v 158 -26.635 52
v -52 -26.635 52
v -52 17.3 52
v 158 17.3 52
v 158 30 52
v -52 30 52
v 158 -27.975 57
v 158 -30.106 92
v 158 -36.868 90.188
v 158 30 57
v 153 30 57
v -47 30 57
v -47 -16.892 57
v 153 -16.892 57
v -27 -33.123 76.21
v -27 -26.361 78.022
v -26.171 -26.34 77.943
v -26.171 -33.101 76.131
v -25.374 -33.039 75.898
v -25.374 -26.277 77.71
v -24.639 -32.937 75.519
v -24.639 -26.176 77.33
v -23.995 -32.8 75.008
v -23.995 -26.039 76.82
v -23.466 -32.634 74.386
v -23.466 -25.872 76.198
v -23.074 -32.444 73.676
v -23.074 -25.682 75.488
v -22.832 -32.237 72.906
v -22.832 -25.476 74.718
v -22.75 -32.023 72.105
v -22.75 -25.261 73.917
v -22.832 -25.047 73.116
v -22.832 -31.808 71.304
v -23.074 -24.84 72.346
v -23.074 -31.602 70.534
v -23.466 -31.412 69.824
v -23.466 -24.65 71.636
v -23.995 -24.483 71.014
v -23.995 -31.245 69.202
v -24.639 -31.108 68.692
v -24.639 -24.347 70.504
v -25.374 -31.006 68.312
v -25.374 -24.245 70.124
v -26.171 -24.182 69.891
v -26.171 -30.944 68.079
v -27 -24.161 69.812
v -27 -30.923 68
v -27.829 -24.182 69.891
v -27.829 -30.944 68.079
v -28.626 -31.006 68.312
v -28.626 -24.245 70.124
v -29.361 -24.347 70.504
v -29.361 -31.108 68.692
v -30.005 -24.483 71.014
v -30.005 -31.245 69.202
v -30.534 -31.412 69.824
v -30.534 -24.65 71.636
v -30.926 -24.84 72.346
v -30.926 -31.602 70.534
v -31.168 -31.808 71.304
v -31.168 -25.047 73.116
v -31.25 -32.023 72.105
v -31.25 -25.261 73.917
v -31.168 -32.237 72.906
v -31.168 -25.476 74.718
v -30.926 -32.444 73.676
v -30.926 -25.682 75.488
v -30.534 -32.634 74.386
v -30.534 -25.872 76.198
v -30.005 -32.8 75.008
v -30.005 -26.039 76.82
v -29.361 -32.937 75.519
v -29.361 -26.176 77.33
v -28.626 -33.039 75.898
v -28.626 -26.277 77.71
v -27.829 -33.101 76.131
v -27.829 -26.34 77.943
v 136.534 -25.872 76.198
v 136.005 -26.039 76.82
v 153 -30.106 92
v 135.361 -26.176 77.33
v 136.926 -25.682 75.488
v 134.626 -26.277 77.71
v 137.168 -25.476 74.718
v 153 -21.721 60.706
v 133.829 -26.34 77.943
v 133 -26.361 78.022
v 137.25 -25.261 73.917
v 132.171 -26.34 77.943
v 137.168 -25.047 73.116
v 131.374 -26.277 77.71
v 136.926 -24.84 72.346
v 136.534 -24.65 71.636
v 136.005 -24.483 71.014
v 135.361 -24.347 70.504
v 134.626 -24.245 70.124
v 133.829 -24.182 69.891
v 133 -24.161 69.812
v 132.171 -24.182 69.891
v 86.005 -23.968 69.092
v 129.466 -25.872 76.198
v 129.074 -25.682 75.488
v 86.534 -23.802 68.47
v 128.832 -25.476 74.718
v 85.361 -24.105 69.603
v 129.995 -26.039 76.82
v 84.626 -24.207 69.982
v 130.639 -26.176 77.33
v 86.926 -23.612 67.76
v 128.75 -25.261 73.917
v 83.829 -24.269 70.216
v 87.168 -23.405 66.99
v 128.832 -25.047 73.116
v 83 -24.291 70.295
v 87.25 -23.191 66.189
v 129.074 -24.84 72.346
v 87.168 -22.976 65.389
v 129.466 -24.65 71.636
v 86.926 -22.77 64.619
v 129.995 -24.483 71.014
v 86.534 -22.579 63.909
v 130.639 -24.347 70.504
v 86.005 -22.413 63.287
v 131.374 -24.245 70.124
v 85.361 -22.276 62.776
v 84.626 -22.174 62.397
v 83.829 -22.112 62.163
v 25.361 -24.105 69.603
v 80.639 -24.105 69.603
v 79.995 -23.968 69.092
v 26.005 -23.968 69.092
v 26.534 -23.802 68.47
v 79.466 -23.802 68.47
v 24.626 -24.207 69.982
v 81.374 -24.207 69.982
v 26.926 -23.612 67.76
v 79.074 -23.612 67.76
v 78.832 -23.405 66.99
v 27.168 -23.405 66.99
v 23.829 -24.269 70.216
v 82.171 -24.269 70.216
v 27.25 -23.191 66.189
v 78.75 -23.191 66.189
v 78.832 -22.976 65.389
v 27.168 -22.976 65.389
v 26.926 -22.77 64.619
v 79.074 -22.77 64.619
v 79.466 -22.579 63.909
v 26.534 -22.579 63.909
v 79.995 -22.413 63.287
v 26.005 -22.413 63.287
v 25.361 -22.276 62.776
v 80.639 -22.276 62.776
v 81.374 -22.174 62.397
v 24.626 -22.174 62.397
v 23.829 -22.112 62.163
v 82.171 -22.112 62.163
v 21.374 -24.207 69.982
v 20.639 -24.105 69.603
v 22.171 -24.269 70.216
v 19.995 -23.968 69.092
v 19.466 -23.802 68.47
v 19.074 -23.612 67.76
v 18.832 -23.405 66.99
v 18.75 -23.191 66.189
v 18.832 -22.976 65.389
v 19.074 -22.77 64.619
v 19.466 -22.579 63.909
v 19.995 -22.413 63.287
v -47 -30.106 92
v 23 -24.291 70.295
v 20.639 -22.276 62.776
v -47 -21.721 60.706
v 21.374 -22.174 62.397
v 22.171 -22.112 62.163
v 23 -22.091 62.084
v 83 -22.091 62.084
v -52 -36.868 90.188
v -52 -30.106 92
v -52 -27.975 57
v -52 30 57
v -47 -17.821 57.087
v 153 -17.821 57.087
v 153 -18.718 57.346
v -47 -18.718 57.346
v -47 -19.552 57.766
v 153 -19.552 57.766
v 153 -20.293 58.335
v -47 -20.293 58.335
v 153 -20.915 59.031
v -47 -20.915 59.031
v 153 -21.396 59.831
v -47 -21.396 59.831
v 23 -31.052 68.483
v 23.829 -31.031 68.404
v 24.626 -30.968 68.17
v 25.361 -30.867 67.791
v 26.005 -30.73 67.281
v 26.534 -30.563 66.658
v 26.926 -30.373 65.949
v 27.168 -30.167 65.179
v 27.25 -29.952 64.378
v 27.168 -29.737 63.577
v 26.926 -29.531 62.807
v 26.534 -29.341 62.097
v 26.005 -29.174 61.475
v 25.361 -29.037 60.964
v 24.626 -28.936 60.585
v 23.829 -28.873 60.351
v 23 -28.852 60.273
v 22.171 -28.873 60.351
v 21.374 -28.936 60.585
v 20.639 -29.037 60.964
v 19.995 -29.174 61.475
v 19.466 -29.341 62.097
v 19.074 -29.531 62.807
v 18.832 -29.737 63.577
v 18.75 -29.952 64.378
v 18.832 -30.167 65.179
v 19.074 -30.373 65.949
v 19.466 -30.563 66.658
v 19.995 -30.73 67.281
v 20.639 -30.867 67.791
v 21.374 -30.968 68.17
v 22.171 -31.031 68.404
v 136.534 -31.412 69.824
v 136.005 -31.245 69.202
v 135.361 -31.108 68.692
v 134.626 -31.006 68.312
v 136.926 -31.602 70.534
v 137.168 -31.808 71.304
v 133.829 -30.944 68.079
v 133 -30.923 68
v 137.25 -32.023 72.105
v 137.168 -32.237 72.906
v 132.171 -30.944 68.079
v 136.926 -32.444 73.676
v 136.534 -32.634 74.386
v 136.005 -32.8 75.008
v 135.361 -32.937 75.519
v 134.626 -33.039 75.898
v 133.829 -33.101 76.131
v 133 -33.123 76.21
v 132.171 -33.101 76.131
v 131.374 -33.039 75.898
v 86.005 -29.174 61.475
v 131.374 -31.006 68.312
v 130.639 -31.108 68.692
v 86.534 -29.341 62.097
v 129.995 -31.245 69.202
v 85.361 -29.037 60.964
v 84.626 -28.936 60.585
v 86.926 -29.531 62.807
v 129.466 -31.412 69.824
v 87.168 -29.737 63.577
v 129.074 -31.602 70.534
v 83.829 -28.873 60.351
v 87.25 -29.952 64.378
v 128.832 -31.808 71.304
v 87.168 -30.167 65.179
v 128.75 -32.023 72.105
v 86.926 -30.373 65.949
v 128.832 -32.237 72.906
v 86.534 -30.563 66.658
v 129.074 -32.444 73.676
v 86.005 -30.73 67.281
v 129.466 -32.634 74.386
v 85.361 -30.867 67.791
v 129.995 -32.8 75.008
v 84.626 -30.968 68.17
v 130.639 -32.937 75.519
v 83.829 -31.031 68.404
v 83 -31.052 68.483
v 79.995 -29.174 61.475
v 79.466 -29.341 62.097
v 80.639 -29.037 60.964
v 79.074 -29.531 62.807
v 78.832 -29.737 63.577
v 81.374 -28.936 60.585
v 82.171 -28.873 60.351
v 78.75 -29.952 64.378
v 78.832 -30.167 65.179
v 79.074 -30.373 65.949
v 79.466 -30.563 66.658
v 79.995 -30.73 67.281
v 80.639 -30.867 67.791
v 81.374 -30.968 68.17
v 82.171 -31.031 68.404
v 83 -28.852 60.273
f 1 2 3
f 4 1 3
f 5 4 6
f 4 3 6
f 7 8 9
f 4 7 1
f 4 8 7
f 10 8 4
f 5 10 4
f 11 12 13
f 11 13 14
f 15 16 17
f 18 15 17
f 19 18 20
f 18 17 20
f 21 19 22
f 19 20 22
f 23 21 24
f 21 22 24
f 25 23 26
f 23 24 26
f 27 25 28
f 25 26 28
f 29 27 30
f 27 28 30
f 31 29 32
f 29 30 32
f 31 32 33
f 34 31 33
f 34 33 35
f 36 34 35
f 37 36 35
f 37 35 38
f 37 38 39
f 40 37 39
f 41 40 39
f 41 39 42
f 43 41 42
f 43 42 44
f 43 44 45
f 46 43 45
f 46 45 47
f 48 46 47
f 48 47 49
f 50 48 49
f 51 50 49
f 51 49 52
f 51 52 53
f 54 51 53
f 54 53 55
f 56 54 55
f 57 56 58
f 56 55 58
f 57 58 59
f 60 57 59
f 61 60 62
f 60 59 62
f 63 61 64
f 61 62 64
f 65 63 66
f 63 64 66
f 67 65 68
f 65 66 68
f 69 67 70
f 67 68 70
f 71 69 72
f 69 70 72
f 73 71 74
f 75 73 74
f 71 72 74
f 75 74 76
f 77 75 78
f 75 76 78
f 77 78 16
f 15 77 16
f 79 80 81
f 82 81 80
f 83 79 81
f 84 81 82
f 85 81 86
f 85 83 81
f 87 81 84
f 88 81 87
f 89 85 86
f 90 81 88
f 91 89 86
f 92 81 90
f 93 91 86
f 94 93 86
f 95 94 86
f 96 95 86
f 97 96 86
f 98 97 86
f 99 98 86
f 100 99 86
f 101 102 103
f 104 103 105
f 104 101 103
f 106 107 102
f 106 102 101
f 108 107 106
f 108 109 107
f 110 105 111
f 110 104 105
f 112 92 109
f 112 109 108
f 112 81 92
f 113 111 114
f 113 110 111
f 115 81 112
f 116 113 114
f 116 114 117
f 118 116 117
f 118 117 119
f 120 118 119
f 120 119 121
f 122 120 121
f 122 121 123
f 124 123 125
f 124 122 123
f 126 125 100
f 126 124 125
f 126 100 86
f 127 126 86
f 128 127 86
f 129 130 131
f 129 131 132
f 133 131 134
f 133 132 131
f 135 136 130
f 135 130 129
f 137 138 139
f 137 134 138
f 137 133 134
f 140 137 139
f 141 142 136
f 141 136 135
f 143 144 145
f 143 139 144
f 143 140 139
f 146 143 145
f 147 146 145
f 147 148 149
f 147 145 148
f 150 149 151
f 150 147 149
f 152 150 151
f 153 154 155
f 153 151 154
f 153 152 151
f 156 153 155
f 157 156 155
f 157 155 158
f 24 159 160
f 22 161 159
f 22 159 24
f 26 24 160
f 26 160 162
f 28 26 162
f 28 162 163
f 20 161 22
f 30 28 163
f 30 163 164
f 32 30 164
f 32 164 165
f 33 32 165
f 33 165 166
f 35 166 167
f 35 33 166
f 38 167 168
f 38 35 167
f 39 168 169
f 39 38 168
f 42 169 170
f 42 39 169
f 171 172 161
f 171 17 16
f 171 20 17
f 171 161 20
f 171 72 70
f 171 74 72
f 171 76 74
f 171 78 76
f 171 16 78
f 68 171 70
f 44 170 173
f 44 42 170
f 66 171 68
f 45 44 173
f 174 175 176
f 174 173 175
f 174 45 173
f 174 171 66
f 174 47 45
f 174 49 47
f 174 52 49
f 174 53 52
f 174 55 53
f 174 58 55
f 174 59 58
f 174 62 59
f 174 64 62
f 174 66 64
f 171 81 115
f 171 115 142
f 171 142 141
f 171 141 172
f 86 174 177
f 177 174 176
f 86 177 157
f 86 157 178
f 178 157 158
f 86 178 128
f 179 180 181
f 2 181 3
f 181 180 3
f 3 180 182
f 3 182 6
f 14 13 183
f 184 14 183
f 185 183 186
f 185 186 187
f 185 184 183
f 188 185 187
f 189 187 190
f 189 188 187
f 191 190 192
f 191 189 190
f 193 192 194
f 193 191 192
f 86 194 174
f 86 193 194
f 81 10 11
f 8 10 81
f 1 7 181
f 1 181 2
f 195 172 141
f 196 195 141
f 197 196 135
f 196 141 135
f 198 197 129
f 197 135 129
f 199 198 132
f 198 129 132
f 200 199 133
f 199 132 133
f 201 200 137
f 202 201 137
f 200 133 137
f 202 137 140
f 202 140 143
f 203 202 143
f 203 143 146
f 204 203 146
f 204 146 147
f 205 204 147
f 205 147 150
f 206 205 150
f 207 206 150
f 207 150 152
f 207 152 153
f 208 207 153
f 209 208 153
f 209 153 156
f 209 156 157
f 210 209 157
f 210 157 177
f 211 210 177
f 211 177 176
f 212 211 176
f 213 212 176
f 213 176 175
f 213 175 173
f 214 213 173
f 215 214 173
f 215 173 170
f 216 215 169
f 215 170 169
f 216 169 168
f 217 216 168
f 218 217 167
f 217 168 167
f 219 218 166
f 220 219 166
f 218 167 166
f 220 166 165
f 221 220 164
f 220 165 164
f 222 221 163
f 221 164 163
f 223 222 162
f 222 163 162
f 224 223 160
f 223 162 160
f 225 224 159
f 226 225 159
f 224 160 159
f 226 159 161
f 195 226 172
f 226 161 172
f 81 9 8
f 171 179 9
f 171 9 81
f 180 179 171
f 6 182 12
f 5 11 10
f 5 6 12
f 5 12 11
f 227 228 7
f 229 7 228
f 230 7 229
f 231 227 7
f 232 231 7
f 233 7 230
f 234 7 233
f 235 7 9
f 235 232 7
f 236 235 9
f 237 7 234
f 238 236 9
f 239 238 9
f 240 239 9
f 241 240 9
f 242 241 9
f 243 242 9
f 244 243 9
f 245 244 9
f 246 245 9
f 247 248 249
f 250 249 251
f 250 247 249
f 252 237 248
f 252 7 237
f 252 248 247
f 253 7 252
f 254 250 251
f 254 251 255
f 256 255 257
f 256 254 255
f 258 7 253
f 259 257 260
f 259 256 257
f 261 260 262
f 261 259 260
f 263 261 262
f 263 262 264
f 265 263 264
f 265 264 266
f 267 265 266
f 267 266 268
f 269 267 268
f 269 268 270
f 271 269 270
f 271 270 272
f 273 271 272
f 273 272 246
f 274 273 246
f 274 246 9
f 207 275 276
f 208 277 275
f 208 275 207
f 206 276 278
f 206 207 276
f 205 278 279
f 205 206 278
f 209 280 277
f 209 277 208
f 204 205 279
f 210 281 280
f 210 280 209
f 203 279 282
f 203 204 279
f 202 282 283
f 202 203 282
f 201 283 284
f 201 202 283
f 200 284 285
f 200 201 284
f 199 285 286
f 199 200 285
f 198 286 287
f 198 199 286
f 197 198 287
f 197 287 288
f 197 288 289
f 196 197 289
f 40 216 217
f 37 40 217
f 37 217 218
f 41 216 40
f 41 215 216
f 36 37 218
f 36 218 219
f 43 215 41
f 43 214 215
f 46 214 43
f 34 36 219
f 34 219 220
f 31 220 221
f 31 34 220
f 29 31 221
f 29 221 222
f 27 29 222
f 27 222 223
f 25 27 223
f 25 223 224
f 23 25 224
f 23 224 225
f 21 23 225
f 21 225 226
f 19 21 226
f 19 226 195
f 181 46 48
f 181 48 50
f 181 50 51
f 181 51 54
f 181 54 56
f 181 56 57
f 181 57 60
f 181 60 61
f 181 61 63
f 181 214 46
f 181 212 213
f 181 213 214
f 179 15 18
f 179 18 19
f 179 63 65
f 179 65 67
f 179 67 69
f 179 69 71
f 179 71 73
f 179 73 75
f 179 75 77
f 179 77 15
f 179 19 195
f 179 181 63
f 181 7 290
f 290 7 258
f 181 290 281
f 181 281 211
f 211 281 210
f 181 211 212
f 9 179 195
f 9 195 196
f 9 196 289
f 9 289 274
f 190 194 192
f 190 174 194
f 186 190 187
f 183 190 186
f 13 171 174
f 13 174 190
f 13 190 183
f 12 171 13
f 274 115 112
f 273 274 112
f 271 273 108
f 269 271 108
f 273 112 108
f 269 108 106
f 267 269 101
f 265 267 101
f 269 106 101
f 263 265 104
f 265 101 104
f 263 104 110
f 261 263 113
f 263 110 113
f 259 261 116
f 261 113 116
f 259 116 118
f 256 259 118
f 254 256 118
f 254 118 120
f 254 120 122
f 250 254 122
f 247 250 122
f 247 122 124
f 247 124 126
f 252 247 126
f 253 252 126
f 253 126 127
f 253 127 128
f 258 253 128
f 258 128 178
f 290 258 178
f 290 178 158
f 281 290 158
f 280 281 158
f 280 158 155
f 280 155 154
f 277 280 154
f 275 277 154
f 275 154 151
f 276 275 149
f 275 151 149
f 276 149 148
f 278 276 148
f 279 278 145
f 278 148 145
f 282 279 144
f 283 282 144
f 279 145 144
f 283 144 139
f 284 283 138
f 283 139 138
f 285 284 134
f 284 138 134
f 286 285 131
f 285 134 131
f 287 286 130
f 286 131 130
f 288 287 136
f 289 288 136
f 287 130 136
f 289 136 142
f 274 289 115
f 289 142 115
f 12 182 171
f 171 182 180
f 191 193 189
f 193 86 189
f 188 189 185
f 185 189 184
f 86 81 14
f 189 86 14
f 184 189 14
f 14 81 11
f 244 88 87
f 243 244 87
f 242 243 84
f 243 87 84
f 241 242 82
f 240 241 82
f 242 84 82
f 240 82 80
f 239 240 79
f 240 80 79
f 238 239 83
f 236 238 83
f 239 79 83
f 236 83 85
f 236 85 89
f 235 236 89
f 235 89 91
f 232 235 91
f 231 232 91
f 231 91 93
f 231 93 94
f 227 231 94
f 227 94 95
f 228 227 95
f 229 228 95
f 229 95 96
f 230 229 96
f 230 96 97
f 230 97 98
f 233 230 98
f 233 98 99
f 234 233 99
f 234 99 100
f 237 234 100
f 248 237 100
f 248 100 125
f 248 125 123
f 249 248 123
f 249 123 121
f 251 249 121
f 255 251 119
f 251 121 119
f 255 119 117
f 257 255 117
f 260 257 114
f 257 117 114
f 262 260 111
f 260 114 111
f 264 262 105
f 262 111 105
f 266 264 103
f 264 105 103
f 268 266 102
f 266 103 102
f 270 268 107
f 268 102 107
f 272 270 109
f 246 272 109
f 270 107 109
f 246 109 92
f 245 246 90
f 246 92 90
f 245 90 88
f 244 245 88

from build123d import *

# Parameters (mm, degrees)
EXTRUDE_1_DEPTH      = 30
SKETCH_2_R           = 44.45
CUT_EXTRUDE_1_DEPTH  = 4
SKETCH_3_R           = 25.5
SKETCH_3_R_2         = 2.25
CUT_EXTRUDE_2_DEPTH  = 188.619295383
CUT_EXTRUDE_3_DEPTH  = 189.215302247
SKETCH_5_R           = 1.65
CUT_EXTRUDE_4_DEPTH  = 189.215302247
EXTRUDE_START        = -30
EXTRUDE_2_DEPTH      = 30
CUT_EXTRUDE_5_DEPTH  = 198.040604952
CUT_EXTRUDE_7_DEPTH  = 233.432785983
CUT_EXTRUDE_8_DEPTH  = 233.432785983
CUT_EXTRUDE_9_DEPTH  = 233.432785983
FILLET_1_R           = 5
CUT_EXTRUDE_10_DEPTH = 233.432785983
EXTRUDE_START_2      = -5
EXTRUDE_3_DEPTH      = 5
EXTRUDE_4_DEPTH      = 5
SKETCH_14_R          = 4.25
CUT_EXTRUDE_11_DEPTH = 189.364728478
SKETCH_16_W          = 43
SKETCH_16_H          = 30
CUT_EXTRUDE_12_DEPTH = 233.432785983
EXTRUDE_7_REACH      = 188.592
SKETCH_18_W          = 210
SKETCH_18_H          = 5
EXTRUDE_8_DEPTH      = 210
EXTRUDE_9_DEPTH      = 5
EXTRUDE_10_DEPTH     = 5
SKETCH_22_R          = 4.25
CUT_EXTRUDE_13_DEPTH = 187.984035343
FILLET_2_R           = 5
SKETCH_23_W          = 158.512158041
SKETCH_23_H          = 103.317713915
CUT_EXTRUDE_14_DEPTH = 234.418610938


with BuildPart() as part:
    # 草图1 → 凸台-拉伸1 (new body)
    with BuildSketch(Plane(origin=(0, 0, 0), x_dir=(1, 0, 0), z_dir=(0, 1, 0))):
        with BuildLine():
            Line((170, 31.93), (170, -31.93))
            ThreePointArc((170, -31.93), (167.781993847, -38.210172909), (162.111885646, -41.704453387))
            Line((162.111885646, -41.704453387), (15.839142344, -73.308400404))
            ThreePointArc((15.839142344, -73.308400404), (-75, 0), (15.839142344, 73.308400404))
            Line((15.839142344, 73.308400404), (162.111885646, 41.704453387))
            ThreePointArc((162.111885646, 41.704453387), (167.781993847, 38.210172909), (170, 31.93))
        make_face()
    extrude(amount=EXTRUDE_1_DEPTH)

    # 草图2 → 切除-拉伸1 (cut)
    with BuildSketch(Plane(origin=(0, 30, 0), x_dir=(1, 0, 0), z_dir=(0, 1, 0))):
        with Locations(Location((0, 0, 0), (0, 0, 270))):
            Circle(SKETCH_2_R)
    extrude(amount=-CUT_EXTRUDE_1_DEPTH, mode=Mode.SUBTRACT)

    # 草图3 → 切除-拉伸2 (cut, through all)
    with BuildSketch(Plane(origin=(0, 26, 0), x_dir=(1, 0, 0), z_dir=(0, 1, 0))):
        with Locations(Location((0, 0, 0), (0, 0, 270))):
            Circle(SKETCH_3_R)
        with Locations(Location((0, 41, 0), (0, 0, 270))):
            Circle(SKETCH_3_R_2)
        with Locations(Location((28.991378029, 28.991378029, 0), (0, 0, 270))):
            Circle(SKETCH_3_R_2)
        with Locations(Location((41, 0, 0), (0, 0, 270))):
            Circle(SKETCH_3_R_2)
        with Locations(Location((28.991378029, -28.991378029, 0), (0, 0, 270))):
            Circle(SKETCH_3_R_2)
        with Locations(Location((0, -41, 0), (0, 0, 270))):
            Circle(SKETCH_3_R_2)
        with Locations(Location((-28.991378029, -28.991378029, 0), (0, 0, 270))):
            Circle(SKETCH_3_R_2)
        with Locations(Location((-41, 0, 0), (0, 0, 270))):
            Circle(SKETCH_3_R_2)
        with Locations(Location((-28.991378029, 28.991378029, 0), (0, 0, 270))):
            Circle(SKETCH_3_R_2)
    extrude(amount=-CUT_EXTRUDE_2_DEPTH, mode=Mode.SUBTRACT)

    # 草图4 → 切除-拉伸3 (cut, through all)
    with BuildSketch(Plane(origin=(0, 30, 0), x_dir=(1, 0, 0), z_dir=(0, 1, 0))):
        with BuildLine():
            Line((124, 18.5), (134, 18.5))
            ThreePointArc((134, 18.5), (152.5, 0), (134, -18.5))
            Line((134, -18.5), (124, -18.5))
            ThreePointArc((124, -18.5), (105.5, 0), (124, 18.5))
        make_face()
    extrude(amount=-CUT_EXTRUDE_3_DEPTH, mode=Mode.SUBTRACT)

    # 草图5 → 切除-拉伸4 (cut, through all)
    with BuildSketch(Plane(origin=(0, 30, 0), x_dir=(1, 0, 0), z_dir=(0, 1, 0))):
        with Locations(Location((116.75, 25.5, 0), (0, 0, 270))):
            Circle(SKETCH_5_R)
        with Locations(Location((141.25, 25.5, 0), (0, 0, 270))):
            Circle(SKETCH_5_R)
        with Locations(Location((141.25, -25.5, 0), (0, 0, 270))):
            Circle(SKETCH_5_R)
        with Locations(Location((116.75, -25.5, 0), (0, 0, 270))):
            Circle(SKETCH_5_R)
    extrude(amount=-CUT_EXTRUDE_4_DEPTH, mode=Mode.SUBTRACT)

    # 草图6 → 凸台-拉伸2 (add)
    with BuildSketch(Plane(origin=(0, 30, 0), x_dir=(1, 0, 0), z_dir=(0, 1, 0)).offset(EXTRUDE_START)):
        with BuildLine():
            Line((158, 95), (-52, 95))
            Line((-52, 95), (-52, 54.046276467))
            ThreePointArc((-52, 54.046276467), (-20.48558667, 72.148047366), (15.839142344, 73.308400404))
            Line((15.839142344, 73.308400404), (158, 42.592874655))
            Line((158, 42.592874655), (158, 95))
        make_face()
        with BuildLine():
            ThreePointArc((15.839142344, -73.308400404), (-20.48558667, -72.148047366), (-52, -54.046276467))
            Line((-52, -54.046276467), (-52, -95))
            Line((-52, -95), (158, -95))
            Line((158, -95), (158, -42.592874655))
            Line((158, -42.592874655), (15.839142344, -73.308400404))
        make_face()
    extrude(amount=EXTRUDE_2_DEPTH)

    # 草图7 → 切除-拉伸5 (cut, through all)
    with BuildSketch(Plane(origin=(0, 30, 0), x_dir=(1, 0, 0), z_dir=(0, 1, 0))):
        with BuildLine():
            Line((-52, 54.046276467), (-52, -54.046276467))
            ThreePointArc((-52, -54.046276467), (-75, 0), (-52, 54.046276467))
        make_face()
        with BuildLine():
            Line((158, 42.592874655), (158, -42.592874655))
            Line((158, -42.592874655), (162.111885646, -41.704453387))
            ThreePointArc((162.111885646, -41.704453387), (167.781993847, -38.210172909), (170, -31.93))
            Line((170, -31.93), (170, 31.93))
            ThreePointArc((170, 31.93), (167.781993847, 38.210172909), (162.111885646, 41.704453387))
            Line((162.111885646, 41.704453387), (158, 42.592874655))
        make_face()
    extrude(amount=-CUT_EXTRUDE_5_DEPTH, mode=Mode.SUBTRACT)

    # 草图9 → 切除-拉伸7 (cut, through all)
    with BuildSketch(Plane.ZY.offset(52)):
        Polygon((-95, 20), (-60, 10.621778265), (-60, 30), (-95, 30), align=None)
    extrude(amount=-CUT_EXTRUDE_7_DEPTH, mode=Mode.SUBTRACT)

    # 草图10 → 切除-拉伸8 (cut, through all)
    with BuildSketch(Plane.ZY.offset(52)):
        Polygon((-95, 12.753066737), (-52, 1.231251463), (-52, 0), (-95, 0), align=None)
    extrude(amount=-CUT_EXTRUDE_8_DEPTH, mode=Mode.SUBTRACT)

    # 草图8 → 切除-拉伸9 (cut, through all)
    with BuildSketch(Plane.ZY.offset(52)):
        Polygon((0, 0), (52, 0), (52, 17.3), (-52, 17.3), (-52, 0), align=None)
    extrude(amount=-CUT_EXTRUDE_9_DEPTH, mode=Mode.SUBTRACT)

    # 圆角1
    fillet_1_edges = [part.edges().sort_by_distance(p)[0] for p in [
        (53, 10.621778265, -60),
    ]]
    fillet(fillet_1_edges, radius=FILLET_1_R)

    # 草图11 → 切除-拉伸10 (cut, through all)
    with BuildSketch(Plane.ZY.offset(52)):
        Polygon((-95, 12.753066737), (-93.188266684, 19.514547521), (-95, 20), align=None)
    extrude(amount=-CUT_EXTRUDE_10_DEPTH, mode=Mode.SUBTRACT)

    # 草图12 → 凸台-拉伸3 (add)
    with BuildSketch(Plane.ZY.offset(52).offset(EXTRUDE_START_2)):
        with BuildLine():
            Line((-93.188266684, 19.514547521), (-60, 30))
            Line((-60, 30), (-60, 17.137905129))
            ThreePointArc((-60, 17.137905129), (-61.956192855, 13.171138428), (-66.294095226, 12.308275998))
            Line((-66.294095226, 12.308275998), (-93.188266684, 19.514547521))
        make_face()
    extrude(amount=EXTRUDE_3_DEPTH)

    # 草图13 → 凸台-拉伸4 (add)
    with BuildSketch(Plane(origin=(158, 0, 0), x_dir=(0, 0, -1), z_dir=(1, 0, 0))):
        with BuildLine():
            Line((66.294095226, 12.308275998), (93.188266684, 19.514547521))
            Line((93.188266684, 19.514547521), (60, 30))
            Line((60, 30), (60, 17.137905129))
            ThreePointArc((60, 17.137905129), (61.956192855, 13.171138428), (66.294095226, 12.308275998))
        make_face()
    extrude(amount=-EXTRUDE_4_DEPTH)

    # 草图14 → 切除-拉伸11 (cut, through all)
    with BuildSketch(Plane(origin=(0, -5.089745962, -1.36379332), x_dir=(1, 0, 0), z_dir=(0, 0.9659258262890681, 0.2588190451025214))):
        with Locations(Location((-27, 82.063690052, 0), (0, 0, 270))):
            Circle(SKETCH_14_R)
        with Locations(Location((23, 82.063690052, 0), (0, 0, 270))):
            Circle(SKETCH_14_R)
        with Locations(Location((83, 82.063690052, 0), (0, 0, 270))):
            Circle(SKETCH_14_R)
        with Locations(Location((133, 82.063690052, 0), (0, 0, 270))):
            Circle(SKETCH_14_R)
    extrude(amount=-CUT_EXTRUDE_11_DEPTH, mode=Mode.SUBTRACT)

    # 草图16 → 切除-拉伸12 (cut, through all)
    with BuildSketch(Plane.ZY.offset(52)):
        with Locations((73.5, 15)):
            Rectangle(SKETCH_16_W, SKETCH_16_H)
    extrude(amount=-CUT_EXTRUDE_12_DEPTH, mode=Mode.SUBTRACT)

    # 凸台-拉伸7: up to this plane
    extrude_7_end = Plane(origin=(0, -11.851226746, -3.175526636), z_dir=(0, -0.9659258262890681, -0.25881904510252146))
    # 草图18 → 凸台-拉伸7 (add, up to the surface)
    with BuildSketch(Plane(origin=(0, 30, 0), x_dir=(1, 0, 0), z_dir=(0, 1, 0)), mode=Mode.PRIVATE) as extrude_7_sk1:
        with Locations((53, -54.5)):
            Rectangle(SKETCH_18_W, SKETCH_18_H)
    extrude_7_tool1 = split(extrude(extrude_7_sk1.sketch, amount=-EXTRUDE_7_REACH, mode=Mode.PRIVATE), bisect_by=extrude_7_end, keep=Keep.BOTH, mode=Mode.PRIVATE)
    add(extrude_7_tool1.solids().sort_by_distance((53, 30, 54.5))[0])

    # 草图19 → 凸台-拉伸8 (add)
    with BuildSketch(Plane.ZY.offset(52)):
        Polygon((57, -27.975210512), (90.188266684, -36.867979769), (92, -30.106498985), (57, -20.72827725), align=None)
    extrude(amount=-EXTRUDE_8_DEPTH)

    # 草图20 → 凸台-拉伸9 (add)
    with BuildSketch(Plane.ZY.offset(52)):
        Polygon((92, -30.106498985), (57, -20.72827725), (57, 30), align=None)
    extrude(amount=-EXTRUDE_9_DEPTH)

    # 草图21 → 凸台-拉伸10 (add)
    with BuildSketch(Plane(origin=(158, 0, 0), x_dir=(0, 0, -1), z_dir=(1, 0, 0))):
        Polygon((-57, 30), (-92, -30.106498985), (-57, -20.72827725), align=None)
    extrude(amount=-EXTRUDE_10_DEPTH)

    # 草图22 → 切除-拉伸13 (cut, through all)
    with BuildSketch(Plane(origin=(0, -5.089745962, -1.36379332), x_dir=(1, 0, 0), z_dir=(0, 0.9659258262890686, 0.25881904510251946))):
        with Locations(Location((-27, -77.936309948, 0), (0, 0, 270))):
            Circle(SKETCH_22_R)
        with Locations(Location((23, -69.936309948, 0), (0, 0, 270))):
            Circle(SKETCH_22_R)
        with Locations(Location((83, -69.936309948, 0), (0, 0, 270))):
            Circle(SKETCH_22_R)
        with Locations(Location((133, -77.936309948, 0), (0, 0, 270))):
            Circle(SKETCH_22_R)
    extrude(amount=-CUT_EXTRUDE_13_DEPTH, mode=Mode.SUBTRACT)

    # 圆角2
    fillet_2_edges = [part.edges().sort_by_distance(p)[0] for p in [
        (53, -20.72827725, 57),
    ]]
    fillet(fillet_2_edges, radius=FILLET_2_R)

    # 草图23 → 切除-拉伸14 (cut, through all)
    with BuildSketch(Plane.ZY.offset(52)):
        with Locations((-27.256079021, 5.306767281)):
            Rectangle(SKETCH_23_W, SKETCH_23_H)
    extrude(amount=-CUT_EXTRUDE_14_DEPTH, mode=Mode.SUBTRACT)


solid = part.part
